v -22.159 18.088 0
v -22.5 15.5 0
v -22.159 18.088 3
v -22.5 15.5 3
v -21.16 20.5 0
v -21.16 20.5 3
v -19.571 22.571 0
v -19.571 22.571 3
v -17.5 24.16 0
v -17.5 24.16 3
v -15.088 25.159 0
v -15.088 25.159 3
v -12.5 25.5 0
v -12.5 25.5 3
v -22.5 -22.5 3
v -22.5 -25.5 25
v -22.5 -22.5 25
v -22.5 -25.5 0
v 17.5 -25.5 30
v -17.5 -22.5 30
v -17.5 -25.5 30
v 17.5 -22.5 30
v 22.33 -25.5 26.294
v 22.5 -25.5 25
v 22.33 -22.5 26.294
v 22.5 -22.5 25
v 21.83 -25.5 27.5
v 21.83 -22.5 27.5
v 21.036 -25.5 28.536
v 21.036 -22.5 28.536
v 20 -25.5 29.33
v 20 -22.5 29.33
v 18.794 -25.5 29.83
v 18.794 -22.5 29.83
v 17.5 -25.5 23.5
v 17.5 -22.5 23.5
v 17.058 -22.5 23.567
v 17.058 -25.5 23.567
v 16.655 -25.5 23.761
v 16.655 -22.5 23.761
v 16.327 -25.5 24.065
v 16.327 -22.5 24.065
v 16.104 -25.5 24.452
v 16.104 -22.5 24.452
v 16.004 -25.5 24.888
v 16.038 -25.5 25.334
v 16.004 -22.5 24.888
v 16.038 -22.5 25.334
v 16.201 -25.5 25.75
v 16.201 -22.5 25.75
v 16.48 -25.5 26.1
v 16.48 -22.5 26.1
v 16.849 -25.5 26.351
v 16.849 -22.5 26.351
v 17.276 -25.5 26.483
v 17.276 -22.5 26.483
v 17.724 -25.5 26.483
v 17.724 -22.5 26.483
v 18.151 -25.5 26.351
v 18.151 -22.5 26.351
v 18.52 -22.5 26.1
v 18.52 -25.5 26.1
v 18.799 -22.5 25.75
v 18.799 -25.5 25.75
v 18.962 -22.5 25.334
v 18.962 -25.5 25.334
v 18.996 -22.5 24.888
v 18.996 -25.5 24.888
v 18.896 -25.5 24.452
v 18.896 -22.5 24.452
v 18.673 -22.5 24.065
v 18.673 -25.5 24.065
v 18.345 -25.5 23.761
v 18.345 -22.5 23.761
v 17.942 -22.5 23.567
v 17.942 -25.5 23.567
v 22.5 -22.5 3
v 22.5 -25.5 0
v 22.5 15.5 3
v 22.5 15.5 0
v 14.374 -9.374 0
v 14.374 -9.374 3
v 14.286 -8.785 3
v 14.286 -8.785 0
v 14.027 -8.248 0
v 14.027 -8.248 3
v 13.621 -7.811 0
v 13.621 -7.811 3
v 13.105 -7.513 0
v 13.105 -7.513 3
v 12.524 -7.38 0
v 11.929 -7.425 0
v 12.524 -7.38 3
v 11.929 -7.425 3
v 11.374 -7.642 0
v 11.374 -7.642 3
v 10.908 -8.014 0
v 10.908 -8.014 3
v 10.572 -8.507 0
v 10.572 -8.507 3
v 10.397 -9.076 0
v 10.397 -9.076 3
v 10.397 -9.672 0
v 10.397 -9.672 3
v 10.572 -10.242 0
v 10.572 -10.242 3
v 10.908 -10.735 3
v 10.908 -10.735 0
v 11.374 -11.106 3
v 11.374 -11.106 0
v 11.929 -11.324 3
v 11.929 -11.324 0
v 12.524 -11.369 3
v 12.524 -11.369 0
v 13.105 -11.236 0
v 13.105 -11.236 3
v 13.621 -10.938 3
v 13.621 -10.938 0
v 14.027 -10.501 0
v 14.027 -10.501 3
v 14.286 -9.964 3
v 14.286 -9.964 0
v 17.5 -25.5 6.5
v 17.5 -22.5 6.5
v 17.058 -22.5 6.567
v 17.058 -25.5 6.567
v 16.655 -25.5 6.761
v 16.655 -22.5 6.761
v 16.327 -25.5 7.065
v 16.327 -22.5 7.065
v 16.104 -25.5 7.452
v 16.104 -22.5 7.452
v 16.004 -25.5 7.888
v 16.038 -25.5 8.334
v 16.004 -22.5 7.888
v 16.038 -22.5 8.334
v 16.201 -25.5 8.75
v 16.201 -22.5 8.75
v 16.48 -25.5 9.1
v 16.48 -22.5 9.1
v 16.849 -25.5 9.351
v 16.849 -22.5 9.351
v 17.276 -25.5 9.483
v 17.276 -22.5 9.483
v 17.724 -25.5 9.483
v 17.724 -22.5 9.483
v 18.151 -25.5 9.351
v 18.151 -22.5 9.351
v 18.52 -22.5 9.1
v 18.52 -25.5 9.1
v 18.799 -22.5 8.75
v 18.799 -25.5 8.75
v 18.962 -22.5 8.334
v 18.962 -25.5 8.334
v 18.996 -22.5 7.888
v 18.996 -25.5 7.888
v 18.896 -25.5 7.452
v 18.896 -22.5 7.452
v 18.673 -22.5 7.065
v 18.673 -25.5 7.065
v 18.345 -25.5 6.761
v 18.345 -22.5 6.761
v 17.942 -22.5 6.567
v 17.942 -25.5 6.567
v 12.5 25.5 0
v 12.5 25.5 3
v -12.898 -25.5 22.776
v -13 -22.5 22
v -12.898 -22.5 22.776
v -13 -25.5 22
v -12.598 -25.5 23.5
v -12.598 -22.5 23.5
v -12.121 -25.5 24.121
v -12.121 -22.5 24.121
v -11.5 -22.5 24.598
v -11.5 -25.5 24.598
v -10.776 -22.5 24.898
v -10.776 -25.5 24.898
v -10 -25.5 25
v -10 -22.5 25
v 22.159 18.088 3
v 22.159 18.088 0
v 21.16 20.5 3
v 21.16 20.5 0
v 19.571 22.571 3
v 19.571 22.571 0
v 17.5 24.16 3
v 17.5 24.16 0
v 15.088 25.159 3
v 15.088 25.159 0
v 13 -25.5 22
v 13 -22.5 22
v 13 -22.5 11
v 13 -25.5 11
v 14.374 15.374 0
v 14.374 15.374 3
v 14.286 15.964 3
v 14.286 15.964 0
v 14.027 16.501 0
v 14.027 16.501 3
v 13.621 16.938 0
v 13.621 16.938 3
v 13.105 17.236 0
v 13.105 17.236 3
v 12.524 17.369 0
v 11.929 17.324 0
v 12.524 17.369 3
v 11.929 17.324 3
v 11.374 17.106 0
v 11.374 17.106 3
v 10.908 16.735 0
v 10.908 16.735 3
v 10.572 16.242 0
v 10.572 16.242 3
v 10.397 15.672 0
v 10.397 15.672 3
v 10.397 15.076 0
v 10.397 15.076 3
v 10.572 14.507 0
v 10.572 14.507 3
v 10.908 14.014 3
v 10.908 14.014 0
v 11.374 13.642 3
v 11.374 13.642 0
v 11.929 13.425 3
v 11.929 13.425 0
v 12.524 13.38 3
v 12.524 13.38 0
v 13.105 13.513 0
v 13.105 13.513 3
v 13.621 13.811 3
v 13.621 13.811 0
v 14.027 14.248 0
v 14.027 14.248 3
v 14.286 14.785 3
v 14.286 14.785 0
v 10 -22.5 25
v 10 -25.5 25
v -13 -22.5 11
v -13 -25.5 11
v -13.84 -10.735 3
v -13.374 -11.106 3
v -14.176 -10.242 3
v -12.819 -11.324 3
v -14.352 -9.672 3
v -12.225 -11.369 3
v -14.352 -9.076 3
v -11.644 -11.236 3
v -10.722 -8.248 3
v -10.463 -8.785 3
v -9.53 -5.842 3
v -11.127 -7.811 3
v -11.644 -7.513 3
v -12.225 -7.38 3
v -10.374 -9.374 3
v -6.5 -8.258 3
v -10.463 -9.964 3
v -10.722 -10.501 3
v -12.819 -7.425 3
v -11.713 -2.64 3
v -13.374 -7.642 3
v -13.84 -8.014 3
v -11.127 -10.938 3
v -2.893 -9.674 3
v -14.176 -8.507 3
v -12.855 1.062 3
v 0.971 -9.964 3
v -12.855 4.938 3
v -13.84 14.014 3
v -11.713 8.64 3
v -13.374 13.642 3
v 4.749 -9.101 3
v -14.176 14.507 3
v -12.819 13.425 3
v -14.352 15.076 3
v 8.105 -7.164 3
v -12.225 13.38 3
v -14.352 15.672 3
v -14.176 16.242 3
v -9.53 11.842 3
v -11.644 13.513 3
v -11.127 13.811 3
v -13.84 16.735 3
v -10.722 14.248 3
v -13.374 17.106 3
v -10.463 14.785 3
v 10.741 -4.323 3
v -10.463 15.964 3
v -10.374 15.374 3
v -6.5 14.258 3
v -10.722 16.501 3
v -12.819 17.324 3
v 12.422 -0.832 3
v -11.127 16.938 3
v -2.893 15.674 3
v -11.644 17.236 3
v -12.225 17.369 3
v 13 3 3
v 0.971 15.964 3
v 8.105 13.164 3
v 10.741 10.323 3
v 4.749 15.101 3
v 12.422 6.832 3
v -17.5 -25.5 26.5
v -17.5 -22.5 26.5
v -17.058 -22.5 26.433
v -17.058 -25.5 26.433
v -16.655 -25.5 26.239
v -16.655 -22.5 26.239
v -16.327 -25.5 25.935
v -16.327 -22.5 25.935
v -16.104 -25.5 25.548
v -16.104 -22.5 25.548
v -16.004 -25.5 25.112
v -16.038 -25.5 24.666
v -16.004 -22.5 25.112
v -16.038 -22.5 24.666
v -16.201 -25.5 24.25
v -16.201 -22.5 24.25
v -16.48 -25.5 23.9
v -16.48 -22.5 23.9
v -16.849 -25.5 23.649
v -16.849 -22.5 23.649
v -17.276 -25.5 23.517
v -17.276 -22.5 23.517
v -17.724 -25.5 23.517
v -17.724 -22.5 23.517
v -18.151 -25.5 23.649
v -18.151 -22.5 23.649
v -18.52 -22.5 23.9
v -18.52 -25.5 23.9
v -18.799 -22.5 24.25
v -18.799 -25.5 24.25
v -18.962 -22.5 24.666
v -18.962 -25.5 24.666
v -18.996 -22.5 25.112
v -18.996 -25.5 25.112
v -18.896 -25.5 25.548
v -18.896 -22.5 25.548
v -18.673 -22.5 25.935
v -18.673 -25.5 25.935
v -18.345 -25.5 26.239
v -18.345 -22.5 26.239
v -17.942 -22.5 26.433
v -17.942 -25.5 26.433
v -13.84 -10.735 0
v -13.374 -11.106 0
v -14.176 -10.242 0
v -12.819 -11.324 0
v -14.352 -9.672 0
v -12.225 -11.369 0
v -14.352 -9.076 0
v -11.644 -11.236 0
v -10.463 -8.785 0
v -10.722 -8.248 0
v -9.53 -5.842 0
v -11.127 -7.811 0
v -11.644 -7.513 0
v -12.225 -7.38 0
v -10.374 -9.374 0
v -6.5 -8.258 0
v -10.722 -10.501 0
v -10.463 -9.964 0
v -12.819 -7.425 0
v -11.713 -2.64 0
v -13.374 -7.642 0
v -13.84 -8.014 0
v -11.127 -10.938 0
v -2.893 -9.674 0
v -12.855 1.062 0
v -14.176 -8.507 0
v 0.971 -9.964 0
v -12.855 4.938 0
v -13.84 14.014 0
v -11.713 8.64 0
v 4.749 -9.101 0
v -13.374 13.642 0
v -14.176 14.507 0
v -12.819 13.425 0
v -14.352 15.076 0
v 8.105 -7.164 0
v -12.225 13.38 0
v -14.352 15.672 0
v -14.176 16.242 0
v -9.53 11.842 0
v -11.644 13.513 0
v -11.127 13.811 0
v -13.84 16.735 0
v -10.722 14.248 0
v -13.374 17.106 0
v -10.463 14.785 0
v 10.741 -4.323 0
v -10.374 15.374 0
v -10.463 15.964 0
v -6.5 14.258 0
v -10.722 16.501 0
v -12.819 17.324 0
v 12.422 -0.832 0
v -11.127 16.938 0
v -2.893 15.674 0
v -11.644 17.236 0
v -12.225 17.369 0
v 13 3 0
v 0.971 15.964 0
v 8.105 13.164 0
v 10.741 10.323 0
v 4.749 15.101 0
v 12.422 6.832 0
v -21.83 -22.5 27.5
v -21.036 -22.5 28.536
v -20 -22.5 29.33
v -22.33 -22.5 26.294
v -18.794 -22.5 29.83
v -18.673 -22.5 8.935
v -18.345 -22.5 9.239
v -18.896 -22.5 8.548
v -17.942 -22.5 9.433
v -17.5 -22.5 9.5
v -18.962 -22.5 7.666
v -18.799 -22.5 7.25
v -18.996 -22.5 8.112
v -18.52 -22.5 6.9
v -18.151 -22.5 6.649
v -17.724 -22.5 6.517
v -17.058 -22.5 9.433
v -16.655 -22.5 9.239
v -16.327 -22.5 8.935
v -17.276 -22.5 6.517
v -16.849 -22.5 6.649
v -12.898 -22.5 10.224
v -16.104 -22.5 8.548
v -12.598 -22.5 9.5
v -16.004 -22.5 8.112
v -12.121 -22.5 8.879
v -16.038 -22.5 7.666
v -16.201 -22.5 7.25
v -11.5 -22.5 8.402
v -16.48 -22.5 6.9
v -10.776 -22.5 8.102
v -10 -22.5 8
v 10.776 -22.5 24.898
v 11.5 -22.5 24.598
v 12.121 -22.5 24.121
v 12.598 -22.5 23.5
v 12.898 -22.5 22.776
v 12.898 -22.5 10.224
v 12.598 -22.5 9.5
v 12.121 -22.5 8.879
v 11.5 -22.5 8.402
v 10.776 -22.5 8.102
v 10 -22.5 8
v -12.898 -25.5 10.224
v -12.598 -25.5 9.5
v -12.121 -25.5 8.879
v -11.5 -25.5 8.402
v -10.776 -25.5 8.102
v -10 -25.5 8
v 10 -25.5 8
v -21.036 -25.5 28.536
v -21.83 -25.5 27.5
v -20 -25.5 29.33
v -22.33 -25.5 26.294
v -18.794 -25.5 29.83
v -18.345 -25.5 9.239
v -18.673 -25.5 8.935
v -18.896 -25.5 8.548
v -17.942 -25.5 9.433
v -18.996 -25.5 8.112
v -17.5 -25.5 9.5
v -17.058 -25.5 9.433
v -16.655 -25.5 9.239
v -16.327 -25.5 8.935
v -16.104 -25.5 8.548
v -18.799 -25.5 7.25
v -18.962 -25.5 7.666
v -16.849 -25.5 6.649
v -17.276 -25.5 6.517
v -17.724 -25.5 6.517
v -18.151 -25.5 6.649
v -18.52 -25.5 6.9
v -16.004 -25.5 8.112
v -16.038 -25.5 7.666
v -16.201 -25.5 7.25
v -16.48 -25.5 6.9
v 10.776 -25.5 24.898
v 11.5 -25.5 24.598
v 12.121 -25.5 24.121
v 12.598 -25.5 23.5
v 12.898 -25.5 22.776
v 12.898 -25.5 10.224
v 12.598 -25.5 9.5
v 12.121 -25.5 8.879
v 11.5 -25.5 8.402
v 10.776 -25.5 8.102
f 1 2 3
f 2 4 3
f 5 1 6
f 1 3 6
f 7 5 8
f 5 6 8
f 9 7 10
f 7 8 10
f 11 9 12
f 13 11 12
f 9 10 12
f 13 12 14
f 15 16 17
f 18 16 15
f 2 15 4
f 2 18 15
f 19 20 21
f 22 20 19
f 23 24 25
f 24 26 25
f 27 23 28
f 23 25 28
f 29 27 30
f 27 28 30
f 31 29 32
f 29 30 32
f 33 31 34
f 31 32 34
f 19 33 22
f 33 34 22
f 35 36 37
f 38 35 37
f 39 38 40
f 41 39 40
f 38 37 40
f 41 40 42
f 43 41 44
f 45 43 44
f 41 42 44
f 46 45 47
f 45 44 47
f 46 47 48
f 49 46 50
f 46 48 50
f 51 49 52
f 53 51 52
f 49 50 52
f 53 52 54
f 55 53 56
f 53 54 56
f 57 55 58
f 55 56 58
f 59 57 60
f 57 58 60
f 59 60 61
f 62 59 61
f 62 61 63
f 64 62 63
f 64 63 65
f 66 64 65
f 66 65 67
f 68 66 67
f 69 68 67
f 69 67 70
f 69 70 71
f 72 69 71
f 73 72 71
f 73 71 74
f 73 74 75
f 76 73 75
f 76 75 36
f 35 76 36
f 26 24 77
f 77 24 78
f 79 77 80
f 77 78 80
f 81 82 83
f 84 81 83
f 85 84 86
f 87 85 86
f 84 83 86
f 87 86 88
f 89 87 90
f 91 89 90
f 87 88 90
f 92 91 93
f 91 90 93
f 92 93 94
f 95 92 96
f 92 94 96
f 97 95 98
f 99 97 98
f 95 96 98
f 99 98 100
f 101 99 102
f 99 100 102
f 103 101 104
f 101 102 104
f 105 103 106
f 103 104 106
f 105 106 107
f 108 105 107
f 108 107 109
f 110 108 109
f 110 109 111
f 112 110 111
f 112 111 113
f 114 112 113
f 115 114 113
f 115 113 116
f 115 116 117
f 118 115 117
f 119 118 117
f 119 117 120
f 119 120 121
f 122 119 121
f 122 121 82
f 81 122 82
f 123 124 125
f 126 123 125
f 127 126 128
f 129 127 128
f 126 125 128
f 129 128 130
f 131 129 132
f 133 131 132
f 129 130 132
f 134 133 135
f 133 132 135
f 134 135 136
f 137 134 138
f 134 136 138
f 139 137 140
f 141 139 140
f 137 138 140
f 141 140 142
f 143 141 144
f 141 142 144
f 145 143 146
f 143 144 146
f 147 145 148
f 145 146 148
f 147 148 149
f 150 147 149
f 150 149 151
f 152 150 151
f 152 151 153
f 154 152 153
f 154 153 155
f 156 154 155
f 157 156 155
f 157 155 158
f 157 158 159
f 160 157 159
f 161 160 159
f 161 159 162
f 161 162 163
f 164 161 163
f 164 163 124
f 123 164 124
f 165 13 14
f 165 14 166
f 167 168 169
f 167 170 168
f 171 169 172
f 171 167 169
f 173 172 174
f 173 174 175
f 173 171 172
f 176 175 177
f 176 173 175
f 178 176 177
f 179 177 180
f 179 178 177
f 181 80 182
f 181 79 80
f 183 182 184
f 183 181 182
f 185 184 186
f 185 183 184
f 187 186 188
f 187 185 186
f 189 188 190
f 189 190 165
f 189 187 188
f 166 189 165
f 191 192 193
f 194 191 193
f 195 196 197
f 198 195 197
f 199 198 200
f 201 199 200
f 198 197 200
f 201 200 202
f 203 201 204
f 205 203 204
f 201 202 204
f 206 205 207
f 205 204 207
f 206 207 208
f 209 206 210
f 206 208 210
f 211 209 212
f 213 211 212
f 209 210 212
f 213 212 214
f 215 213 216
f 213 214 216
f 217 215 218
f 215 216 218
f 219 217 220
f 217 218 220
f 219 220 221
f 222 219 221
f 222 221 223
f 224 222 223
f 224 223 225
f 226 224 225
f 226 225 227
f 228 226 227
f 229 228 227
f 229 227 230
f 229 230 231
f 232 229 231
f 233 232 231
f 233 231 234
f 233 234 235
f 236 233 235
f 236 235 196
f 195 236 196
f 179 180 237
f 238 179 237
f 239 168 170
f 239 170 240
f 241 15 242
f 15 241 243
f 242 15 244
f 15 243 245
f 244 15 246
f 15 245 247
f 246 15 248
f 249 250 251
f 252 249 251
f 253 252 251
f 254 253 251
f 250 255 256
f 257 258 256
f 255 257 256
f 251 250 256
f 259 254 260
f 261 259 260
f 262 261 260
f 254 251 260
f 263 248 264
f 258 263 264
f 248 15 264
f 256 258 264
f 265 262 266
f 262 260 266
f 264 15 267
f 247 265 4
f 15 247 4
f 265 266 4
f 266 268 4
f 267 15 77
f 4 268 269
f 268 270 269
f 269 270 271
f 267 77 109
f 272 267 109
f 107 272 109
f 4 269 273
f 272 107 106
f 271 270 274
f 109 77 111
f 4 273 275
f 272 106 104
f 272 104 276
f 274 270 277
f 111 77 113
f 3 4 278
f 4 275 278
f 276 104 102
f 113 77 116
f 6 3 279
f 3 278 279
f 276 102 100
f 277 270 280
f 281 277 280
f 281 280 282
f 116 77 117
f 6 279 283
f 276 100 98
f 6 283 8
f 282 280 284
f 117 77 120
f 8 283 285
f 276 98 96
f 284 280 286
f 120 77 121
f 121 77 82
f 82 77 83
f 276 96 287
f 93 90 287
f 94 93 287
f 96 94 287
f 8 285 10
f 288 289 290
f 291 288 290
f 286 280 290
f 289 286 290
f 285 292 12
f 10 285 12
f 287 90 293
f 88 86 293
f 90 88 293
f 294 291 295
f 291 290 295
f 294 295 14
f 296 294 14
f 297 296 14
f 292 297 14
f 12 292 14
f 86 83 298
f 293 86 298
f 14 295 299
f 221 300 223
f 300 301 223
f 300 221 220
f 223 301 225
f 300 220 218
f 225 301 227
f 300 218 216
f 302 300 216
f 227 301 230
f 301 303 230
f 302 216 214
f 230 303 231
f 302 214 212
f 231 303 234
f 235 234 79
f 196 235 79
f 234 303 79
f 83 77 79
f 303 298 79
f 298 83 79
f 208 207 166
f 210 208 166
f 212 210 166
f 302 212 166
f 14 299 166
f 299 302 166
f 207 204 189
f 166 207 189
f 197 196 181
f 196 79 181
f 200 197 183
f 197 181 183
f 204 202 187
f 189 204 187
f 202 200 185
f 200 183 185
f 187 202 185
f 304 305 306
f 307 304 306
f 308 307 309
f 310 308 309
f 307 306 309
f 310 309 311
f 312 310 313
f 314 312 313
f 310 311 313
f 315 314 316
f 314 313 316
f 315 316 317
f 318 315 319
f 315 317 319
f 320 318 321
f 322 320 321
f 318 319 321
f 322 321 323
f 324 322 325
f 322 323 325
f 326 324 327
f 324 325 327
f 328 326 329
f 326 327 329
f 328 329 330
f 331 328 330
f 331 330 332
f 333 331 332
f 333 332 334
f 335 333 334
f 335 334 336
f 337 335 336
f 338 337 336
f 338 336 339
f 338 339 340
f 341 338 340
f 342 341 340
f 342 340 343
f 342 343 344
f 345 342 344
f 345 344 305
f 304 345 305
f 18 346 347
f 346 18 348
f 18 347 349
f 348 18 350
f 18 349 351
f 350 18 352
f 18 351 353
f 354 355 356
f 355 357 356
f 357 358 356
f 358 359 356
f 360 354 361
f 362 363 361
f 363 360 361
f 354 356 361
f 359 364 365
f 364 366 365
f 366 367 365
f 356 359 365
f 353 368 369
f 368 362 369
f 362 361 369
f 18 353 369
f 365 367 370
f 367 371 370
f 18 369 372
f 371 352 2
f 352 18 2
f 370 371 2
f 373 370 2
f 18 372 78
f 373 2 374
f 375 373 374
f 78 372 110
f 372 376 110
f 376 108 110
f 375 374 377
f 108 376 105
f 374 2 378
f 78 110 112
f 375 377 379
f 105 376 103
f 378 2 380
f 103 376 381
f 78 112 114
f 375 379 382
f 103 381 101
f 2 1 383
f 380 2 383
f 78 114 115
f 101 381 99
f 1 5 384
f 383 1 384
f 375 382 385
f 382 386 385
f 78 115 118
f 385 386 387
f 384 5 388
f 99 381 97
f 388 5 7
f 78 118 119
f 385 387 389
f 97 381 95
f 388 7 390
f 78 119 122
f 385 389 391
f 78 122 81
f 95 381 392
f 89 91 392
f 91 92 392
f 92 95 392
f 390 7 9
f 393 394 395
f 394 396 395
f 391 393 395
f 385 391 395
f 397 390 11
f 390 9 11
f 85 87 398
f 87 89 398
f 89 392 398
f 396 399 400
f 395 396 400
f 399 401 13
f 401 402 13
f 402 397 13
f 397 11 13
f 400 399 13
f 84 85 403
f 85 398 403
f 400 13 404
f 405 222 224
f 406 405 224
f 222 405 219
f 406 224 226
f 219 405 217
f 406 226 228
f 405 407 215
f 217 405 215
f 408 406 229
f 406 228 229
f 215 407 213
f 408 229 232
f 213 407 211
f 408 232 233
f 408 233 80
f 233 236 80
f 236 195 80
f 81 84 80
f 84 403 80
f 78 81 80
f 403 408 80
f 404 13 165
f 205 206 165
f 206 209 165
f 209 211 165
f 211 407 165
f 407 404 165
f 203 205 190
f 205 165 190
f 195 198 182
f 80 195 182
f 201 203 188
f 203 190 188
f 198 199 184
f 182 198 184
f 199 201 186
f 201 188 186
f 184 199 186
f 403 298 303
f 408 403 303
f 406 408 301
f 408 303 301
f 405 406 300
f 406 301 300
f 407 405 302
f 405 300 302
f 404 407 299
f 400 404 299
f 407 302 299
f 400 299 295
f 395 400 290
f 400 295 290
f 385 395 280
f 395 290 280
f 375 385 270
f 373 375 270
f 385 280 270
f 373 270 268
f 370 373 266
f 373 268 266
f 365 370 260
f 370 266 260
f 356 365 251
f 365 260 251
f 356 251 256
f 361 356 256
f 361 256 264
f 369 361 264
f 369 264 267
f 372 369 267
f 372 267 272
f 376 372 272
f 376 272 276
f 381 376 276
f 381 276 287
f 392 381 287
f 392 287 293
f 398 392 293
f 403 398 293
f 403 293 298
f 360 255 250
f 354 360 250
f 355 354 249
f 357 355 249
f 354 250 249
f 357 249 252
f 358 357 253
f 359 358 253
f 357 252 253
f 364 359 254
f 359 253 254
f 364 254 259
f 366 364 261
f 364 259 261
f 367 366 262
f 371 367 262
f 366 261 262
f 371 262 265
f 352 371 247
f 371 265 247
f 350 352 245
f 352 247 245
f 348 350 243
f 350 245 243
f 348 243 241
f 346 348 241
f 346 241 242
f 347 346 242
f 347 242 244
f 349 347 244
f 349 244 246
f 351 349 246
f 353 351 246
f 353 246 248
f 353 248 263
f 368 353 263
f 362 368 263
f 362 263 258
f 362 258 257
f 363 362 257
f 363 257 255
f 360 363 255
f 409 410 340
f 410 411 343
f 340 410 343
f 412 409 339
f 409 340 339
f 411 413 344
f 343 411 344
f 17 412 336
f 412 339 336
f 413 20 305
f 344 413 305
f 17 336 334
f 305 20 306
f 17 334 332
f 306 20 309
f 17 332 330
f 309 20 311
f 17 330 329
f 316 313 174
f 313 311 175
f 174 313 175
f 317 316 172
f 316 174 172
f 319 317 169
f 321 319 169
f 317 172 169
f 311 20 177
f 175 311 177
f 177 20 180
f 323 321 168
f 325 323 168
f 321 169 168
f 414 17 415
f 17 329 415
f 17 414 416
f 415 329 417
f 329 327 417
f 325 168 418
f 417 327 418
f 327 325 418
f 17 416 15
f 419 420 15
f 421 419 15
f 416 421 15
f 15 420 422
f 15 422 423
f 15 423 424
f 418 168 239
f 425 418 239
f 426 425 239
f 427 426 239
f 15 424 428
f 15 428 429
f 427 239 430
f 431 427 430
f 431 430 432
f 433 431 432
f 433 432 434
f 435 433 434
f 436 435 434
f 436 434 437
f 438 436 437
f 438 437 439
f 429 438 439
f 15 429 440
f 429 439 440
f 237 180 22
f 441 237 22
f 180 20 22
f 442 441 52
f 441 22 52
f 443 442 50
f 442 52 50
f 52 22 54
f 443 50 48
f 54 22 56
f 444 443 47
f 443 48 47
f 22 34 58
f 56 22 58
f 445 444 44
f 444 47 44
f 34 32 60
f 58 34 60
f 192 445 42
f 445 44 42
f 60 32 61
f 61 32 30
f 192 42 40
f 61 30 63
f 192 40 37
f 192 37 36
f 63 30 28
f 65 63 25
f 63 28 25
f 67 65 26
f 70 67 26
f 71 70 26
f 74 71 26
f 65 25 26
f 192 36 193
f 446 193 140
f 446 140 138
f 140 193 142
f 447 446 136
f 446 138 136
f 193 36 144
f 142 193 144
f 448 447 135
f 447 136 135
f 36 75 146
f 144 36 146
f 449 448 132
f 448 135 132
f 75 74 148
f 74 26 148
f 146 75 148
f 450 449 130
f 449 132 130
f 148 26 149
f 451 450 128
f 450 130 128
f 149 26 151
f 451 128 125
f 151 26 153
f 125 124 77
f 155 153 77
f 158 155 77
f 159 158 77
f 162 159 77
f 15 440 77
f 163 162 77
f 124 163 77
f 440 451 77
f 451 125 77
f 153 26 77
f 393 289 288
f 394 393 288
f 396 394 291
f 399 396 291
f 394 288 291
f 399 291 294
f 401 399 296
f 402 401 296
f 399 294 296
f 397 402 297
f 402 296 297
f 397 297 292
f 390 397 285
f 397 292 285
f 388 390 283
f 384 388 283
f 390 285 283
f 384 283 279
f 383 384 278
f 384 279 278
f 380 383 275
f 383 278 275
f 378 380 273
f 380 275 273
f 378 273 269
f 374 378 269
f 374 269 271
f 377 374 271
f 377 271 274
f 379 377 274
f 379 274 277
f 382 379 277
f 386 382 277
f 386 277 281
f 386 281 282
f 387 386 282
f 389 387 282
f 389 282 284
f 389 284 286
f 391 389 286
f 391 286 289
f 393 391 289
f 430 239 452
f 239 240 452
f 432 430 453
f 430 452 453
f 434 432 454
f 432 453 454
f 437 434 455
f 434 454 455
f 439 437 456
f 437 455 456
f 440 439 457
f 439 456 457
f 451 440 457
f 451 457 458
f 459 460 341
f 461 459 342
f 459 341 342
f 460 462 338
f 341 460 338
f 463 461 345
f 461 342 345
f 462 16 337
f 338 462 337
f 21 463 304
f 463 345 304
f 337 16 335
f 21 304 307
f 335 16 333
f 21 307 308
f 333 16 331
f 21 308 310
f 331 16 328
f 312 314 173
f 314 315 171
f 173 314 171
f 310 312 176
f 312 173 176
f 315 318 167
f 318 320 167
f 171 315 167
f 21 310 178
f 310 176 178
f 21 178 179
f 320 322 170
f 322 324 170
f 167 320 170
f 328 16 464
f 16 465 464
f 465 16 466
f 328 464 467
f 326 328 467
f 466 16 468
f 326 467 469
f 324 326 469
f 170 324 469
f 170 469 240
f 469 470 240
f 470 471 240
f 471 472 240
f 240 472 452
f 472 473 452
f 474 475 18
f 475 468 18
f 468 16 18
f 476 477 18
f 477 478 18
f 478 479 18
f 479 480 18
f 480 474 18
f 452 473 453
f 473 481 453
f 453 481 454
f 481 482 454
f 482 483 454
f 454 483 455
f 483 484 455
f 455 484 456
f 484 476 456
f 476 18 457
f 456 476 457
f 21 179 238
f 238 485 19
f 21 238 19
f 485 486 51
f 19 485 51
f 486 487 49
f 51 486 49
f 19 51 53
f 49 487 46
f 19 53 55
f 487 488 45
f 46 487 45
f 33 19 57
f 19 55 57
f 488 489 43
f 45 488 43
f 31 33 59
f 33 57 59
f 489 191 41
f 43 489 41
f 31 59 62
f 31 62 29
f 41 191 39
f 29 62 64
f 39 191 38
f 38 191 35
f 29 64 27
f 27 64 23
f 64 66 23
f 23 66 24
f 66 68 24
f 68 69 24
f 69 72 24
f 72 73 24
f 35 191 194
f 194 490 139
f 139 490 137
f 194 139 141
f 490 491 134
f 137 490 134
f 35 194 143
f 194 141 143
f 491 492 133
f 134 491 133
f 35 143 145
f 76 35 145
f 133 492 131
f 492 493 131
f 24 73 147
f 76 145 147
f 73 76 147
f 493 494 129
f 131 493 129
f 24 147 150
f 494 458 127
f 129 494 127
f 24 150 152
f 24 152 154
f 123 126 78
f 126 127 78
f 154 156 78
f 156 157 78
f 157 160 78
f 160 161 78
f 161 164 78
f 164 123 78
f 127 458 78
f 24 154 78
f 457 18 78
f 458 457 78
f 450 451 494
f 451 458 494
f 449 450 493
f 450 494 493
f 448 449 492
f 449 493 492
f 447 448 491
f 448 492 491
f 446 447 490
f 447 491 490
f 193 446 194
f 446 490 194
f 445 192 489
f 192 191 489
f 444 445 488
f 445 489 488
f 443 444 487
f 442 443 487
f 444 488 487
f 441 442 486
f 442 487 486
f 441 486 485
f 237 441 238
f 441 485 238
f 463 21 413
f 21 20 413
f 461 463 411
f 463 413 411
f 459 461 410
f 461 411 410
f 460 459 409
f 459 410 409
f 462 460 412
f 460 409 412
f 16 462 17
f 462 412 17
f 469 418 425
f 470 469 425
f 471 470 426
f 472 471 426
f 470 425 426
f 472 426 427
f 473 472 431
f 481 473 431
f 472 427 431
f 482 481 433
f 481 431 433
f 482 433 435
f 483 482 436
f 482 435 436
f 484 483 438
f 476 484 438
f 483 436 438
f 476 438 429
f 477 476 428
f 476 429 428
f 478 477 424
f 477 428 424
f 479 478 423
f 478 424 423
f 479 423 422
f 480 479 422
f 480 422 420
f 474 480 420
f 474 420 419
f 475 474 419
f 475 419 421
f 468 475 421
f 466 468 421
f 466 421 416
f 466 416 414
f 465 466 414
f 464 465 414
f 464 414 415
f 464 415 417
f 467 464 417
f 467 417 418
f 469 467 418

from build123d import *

# Parameters (mm, degrees)
SKETCH_1_W          = 45
SKETCH_1_H          = 51
EXTRUDE_1_DEPTH     = 30
SKETCH_2_W          = 27
SKETCH_2_H          = 48
CUT_EXTRUDE_1_DEPTH = 60.793394284
SKETCH_3_R          = 1.5
SKETCH_3_W          = 26
SKETCH_3_H          = 17
CUT_EXTRUDE_2_DEPTH = 61.911821513
FILLET_1_R          = 3
SKETCH_4_R          = 13
SKETCH_4_R_2        = 2
CUT_EXTRUDE_3_DEPTH = 30
FILLET_2_R          = 10
FILLET_3_R          = 5


with BuildPart() as part:
    # 草图1 → 凸台-拉伸1 (new body)
    with BuildSketch(Plane.XY):
        Rectangle(SKETCH_1_W, SKETCH_1_H)
    extrude(amount=EXTRUDE_1_DEPTH)

    # 草图2 → 切除-拉伸1 (cut, through all)
    with BuildSketch(Plane(origin=(22.5, 0, 0), x_dir=(0, 0, -1), z_dir=(1, 0, 0))):
        with Locations((-16.5, 1.5)):
            Rectangle(SKETCH_2_W, SKETCH_2_H)
    extrude(amount=-CUT_EXTRUDE_1_DEPTH, mode=Mode.SUBTRACT)

    # 草图3 → 切除-拉伸2 (cut, through all)
    with BuildSketch(Plane(origin=(0, -22.5, 0), x_dir=(1, 0, 0), z_dir=(0, 1, 0))):
        with Locations(Location((-17.5, -8, 0), (0, 0, 270))):
            Circle(SKETCH_3_R)
        with Locations(Location((-17.5, -25, 0), (0, 0, 270))):
            Circle(SKETCH_3_R)
        with Locations(Location((17.5, -25, 0), (0, 0, 90))):
            Circle(SKETCH_3_R)
        with Locations(Location((17.5, -8, 0), (0, 0, 90))):
            Circle(SKETCH_3_R)
        with Locations((0, -16.5)):
            Rectangle(SKETCH_3_W, SKETCH_3_H)
    extrude(amount=-CUT_EXTRUDE_2_DEPTH, mode=Mode.SUBTRACT)

    # 圆角1
    fillet_1_edges = [part.edges().sort_by_distance(p)[0] for p in [
        (13, -24, 8),
        (13, -24, 25),
        (-13, -24, 25),
        (-13, -24, 8),
    ]]
    fillet(fillet_1_edges, radius=FILLET_1_R)

    # 草图4 → 切除-拉伸3 (cut)
    with BuildSketch(Plane.XY.offset(3)):
        with Locations((0, 3)):
            Circle(SKETCH_4_R)
        with Locations((12.374368671, 15.374368671)):
            Circle(SKETCH_4_R_2)
        with Locations((-12.374368671, 15.374368671)):
            Circle(SKETCH_4_R_2)
        with Locations((-12.374368671, -9.374368671)):
            Circle(SKETCH_4_R_2)
        with Locations((12.374368671, -9.374368671)):
            Circle(SKETCH_4_R_2)
    extrude(amount=-CUT_EXTRUDE_3_DEPTH, mode=Mode.SUBTRACT)

    # 圆角2
    fillet_2_edges = [part.edges().sort_by_distance(p)[0] for p in [
        (-22.5, 25.5, 1.5),
        (22.5, 25.5, 1.5),
    ]]
    fillet(fillet_2_edges, radius=FILLET_2_R)

    # 圆角3
    fillet_3_edges = [part.edges().sort_by_distance(p)[0] for p in [
        (-22.5, -24, 30),
        (22.5, -24, 30),
    ]]
    fillet(fillet_3_edges, radius=FILLET_3_R)


solid = part.part
